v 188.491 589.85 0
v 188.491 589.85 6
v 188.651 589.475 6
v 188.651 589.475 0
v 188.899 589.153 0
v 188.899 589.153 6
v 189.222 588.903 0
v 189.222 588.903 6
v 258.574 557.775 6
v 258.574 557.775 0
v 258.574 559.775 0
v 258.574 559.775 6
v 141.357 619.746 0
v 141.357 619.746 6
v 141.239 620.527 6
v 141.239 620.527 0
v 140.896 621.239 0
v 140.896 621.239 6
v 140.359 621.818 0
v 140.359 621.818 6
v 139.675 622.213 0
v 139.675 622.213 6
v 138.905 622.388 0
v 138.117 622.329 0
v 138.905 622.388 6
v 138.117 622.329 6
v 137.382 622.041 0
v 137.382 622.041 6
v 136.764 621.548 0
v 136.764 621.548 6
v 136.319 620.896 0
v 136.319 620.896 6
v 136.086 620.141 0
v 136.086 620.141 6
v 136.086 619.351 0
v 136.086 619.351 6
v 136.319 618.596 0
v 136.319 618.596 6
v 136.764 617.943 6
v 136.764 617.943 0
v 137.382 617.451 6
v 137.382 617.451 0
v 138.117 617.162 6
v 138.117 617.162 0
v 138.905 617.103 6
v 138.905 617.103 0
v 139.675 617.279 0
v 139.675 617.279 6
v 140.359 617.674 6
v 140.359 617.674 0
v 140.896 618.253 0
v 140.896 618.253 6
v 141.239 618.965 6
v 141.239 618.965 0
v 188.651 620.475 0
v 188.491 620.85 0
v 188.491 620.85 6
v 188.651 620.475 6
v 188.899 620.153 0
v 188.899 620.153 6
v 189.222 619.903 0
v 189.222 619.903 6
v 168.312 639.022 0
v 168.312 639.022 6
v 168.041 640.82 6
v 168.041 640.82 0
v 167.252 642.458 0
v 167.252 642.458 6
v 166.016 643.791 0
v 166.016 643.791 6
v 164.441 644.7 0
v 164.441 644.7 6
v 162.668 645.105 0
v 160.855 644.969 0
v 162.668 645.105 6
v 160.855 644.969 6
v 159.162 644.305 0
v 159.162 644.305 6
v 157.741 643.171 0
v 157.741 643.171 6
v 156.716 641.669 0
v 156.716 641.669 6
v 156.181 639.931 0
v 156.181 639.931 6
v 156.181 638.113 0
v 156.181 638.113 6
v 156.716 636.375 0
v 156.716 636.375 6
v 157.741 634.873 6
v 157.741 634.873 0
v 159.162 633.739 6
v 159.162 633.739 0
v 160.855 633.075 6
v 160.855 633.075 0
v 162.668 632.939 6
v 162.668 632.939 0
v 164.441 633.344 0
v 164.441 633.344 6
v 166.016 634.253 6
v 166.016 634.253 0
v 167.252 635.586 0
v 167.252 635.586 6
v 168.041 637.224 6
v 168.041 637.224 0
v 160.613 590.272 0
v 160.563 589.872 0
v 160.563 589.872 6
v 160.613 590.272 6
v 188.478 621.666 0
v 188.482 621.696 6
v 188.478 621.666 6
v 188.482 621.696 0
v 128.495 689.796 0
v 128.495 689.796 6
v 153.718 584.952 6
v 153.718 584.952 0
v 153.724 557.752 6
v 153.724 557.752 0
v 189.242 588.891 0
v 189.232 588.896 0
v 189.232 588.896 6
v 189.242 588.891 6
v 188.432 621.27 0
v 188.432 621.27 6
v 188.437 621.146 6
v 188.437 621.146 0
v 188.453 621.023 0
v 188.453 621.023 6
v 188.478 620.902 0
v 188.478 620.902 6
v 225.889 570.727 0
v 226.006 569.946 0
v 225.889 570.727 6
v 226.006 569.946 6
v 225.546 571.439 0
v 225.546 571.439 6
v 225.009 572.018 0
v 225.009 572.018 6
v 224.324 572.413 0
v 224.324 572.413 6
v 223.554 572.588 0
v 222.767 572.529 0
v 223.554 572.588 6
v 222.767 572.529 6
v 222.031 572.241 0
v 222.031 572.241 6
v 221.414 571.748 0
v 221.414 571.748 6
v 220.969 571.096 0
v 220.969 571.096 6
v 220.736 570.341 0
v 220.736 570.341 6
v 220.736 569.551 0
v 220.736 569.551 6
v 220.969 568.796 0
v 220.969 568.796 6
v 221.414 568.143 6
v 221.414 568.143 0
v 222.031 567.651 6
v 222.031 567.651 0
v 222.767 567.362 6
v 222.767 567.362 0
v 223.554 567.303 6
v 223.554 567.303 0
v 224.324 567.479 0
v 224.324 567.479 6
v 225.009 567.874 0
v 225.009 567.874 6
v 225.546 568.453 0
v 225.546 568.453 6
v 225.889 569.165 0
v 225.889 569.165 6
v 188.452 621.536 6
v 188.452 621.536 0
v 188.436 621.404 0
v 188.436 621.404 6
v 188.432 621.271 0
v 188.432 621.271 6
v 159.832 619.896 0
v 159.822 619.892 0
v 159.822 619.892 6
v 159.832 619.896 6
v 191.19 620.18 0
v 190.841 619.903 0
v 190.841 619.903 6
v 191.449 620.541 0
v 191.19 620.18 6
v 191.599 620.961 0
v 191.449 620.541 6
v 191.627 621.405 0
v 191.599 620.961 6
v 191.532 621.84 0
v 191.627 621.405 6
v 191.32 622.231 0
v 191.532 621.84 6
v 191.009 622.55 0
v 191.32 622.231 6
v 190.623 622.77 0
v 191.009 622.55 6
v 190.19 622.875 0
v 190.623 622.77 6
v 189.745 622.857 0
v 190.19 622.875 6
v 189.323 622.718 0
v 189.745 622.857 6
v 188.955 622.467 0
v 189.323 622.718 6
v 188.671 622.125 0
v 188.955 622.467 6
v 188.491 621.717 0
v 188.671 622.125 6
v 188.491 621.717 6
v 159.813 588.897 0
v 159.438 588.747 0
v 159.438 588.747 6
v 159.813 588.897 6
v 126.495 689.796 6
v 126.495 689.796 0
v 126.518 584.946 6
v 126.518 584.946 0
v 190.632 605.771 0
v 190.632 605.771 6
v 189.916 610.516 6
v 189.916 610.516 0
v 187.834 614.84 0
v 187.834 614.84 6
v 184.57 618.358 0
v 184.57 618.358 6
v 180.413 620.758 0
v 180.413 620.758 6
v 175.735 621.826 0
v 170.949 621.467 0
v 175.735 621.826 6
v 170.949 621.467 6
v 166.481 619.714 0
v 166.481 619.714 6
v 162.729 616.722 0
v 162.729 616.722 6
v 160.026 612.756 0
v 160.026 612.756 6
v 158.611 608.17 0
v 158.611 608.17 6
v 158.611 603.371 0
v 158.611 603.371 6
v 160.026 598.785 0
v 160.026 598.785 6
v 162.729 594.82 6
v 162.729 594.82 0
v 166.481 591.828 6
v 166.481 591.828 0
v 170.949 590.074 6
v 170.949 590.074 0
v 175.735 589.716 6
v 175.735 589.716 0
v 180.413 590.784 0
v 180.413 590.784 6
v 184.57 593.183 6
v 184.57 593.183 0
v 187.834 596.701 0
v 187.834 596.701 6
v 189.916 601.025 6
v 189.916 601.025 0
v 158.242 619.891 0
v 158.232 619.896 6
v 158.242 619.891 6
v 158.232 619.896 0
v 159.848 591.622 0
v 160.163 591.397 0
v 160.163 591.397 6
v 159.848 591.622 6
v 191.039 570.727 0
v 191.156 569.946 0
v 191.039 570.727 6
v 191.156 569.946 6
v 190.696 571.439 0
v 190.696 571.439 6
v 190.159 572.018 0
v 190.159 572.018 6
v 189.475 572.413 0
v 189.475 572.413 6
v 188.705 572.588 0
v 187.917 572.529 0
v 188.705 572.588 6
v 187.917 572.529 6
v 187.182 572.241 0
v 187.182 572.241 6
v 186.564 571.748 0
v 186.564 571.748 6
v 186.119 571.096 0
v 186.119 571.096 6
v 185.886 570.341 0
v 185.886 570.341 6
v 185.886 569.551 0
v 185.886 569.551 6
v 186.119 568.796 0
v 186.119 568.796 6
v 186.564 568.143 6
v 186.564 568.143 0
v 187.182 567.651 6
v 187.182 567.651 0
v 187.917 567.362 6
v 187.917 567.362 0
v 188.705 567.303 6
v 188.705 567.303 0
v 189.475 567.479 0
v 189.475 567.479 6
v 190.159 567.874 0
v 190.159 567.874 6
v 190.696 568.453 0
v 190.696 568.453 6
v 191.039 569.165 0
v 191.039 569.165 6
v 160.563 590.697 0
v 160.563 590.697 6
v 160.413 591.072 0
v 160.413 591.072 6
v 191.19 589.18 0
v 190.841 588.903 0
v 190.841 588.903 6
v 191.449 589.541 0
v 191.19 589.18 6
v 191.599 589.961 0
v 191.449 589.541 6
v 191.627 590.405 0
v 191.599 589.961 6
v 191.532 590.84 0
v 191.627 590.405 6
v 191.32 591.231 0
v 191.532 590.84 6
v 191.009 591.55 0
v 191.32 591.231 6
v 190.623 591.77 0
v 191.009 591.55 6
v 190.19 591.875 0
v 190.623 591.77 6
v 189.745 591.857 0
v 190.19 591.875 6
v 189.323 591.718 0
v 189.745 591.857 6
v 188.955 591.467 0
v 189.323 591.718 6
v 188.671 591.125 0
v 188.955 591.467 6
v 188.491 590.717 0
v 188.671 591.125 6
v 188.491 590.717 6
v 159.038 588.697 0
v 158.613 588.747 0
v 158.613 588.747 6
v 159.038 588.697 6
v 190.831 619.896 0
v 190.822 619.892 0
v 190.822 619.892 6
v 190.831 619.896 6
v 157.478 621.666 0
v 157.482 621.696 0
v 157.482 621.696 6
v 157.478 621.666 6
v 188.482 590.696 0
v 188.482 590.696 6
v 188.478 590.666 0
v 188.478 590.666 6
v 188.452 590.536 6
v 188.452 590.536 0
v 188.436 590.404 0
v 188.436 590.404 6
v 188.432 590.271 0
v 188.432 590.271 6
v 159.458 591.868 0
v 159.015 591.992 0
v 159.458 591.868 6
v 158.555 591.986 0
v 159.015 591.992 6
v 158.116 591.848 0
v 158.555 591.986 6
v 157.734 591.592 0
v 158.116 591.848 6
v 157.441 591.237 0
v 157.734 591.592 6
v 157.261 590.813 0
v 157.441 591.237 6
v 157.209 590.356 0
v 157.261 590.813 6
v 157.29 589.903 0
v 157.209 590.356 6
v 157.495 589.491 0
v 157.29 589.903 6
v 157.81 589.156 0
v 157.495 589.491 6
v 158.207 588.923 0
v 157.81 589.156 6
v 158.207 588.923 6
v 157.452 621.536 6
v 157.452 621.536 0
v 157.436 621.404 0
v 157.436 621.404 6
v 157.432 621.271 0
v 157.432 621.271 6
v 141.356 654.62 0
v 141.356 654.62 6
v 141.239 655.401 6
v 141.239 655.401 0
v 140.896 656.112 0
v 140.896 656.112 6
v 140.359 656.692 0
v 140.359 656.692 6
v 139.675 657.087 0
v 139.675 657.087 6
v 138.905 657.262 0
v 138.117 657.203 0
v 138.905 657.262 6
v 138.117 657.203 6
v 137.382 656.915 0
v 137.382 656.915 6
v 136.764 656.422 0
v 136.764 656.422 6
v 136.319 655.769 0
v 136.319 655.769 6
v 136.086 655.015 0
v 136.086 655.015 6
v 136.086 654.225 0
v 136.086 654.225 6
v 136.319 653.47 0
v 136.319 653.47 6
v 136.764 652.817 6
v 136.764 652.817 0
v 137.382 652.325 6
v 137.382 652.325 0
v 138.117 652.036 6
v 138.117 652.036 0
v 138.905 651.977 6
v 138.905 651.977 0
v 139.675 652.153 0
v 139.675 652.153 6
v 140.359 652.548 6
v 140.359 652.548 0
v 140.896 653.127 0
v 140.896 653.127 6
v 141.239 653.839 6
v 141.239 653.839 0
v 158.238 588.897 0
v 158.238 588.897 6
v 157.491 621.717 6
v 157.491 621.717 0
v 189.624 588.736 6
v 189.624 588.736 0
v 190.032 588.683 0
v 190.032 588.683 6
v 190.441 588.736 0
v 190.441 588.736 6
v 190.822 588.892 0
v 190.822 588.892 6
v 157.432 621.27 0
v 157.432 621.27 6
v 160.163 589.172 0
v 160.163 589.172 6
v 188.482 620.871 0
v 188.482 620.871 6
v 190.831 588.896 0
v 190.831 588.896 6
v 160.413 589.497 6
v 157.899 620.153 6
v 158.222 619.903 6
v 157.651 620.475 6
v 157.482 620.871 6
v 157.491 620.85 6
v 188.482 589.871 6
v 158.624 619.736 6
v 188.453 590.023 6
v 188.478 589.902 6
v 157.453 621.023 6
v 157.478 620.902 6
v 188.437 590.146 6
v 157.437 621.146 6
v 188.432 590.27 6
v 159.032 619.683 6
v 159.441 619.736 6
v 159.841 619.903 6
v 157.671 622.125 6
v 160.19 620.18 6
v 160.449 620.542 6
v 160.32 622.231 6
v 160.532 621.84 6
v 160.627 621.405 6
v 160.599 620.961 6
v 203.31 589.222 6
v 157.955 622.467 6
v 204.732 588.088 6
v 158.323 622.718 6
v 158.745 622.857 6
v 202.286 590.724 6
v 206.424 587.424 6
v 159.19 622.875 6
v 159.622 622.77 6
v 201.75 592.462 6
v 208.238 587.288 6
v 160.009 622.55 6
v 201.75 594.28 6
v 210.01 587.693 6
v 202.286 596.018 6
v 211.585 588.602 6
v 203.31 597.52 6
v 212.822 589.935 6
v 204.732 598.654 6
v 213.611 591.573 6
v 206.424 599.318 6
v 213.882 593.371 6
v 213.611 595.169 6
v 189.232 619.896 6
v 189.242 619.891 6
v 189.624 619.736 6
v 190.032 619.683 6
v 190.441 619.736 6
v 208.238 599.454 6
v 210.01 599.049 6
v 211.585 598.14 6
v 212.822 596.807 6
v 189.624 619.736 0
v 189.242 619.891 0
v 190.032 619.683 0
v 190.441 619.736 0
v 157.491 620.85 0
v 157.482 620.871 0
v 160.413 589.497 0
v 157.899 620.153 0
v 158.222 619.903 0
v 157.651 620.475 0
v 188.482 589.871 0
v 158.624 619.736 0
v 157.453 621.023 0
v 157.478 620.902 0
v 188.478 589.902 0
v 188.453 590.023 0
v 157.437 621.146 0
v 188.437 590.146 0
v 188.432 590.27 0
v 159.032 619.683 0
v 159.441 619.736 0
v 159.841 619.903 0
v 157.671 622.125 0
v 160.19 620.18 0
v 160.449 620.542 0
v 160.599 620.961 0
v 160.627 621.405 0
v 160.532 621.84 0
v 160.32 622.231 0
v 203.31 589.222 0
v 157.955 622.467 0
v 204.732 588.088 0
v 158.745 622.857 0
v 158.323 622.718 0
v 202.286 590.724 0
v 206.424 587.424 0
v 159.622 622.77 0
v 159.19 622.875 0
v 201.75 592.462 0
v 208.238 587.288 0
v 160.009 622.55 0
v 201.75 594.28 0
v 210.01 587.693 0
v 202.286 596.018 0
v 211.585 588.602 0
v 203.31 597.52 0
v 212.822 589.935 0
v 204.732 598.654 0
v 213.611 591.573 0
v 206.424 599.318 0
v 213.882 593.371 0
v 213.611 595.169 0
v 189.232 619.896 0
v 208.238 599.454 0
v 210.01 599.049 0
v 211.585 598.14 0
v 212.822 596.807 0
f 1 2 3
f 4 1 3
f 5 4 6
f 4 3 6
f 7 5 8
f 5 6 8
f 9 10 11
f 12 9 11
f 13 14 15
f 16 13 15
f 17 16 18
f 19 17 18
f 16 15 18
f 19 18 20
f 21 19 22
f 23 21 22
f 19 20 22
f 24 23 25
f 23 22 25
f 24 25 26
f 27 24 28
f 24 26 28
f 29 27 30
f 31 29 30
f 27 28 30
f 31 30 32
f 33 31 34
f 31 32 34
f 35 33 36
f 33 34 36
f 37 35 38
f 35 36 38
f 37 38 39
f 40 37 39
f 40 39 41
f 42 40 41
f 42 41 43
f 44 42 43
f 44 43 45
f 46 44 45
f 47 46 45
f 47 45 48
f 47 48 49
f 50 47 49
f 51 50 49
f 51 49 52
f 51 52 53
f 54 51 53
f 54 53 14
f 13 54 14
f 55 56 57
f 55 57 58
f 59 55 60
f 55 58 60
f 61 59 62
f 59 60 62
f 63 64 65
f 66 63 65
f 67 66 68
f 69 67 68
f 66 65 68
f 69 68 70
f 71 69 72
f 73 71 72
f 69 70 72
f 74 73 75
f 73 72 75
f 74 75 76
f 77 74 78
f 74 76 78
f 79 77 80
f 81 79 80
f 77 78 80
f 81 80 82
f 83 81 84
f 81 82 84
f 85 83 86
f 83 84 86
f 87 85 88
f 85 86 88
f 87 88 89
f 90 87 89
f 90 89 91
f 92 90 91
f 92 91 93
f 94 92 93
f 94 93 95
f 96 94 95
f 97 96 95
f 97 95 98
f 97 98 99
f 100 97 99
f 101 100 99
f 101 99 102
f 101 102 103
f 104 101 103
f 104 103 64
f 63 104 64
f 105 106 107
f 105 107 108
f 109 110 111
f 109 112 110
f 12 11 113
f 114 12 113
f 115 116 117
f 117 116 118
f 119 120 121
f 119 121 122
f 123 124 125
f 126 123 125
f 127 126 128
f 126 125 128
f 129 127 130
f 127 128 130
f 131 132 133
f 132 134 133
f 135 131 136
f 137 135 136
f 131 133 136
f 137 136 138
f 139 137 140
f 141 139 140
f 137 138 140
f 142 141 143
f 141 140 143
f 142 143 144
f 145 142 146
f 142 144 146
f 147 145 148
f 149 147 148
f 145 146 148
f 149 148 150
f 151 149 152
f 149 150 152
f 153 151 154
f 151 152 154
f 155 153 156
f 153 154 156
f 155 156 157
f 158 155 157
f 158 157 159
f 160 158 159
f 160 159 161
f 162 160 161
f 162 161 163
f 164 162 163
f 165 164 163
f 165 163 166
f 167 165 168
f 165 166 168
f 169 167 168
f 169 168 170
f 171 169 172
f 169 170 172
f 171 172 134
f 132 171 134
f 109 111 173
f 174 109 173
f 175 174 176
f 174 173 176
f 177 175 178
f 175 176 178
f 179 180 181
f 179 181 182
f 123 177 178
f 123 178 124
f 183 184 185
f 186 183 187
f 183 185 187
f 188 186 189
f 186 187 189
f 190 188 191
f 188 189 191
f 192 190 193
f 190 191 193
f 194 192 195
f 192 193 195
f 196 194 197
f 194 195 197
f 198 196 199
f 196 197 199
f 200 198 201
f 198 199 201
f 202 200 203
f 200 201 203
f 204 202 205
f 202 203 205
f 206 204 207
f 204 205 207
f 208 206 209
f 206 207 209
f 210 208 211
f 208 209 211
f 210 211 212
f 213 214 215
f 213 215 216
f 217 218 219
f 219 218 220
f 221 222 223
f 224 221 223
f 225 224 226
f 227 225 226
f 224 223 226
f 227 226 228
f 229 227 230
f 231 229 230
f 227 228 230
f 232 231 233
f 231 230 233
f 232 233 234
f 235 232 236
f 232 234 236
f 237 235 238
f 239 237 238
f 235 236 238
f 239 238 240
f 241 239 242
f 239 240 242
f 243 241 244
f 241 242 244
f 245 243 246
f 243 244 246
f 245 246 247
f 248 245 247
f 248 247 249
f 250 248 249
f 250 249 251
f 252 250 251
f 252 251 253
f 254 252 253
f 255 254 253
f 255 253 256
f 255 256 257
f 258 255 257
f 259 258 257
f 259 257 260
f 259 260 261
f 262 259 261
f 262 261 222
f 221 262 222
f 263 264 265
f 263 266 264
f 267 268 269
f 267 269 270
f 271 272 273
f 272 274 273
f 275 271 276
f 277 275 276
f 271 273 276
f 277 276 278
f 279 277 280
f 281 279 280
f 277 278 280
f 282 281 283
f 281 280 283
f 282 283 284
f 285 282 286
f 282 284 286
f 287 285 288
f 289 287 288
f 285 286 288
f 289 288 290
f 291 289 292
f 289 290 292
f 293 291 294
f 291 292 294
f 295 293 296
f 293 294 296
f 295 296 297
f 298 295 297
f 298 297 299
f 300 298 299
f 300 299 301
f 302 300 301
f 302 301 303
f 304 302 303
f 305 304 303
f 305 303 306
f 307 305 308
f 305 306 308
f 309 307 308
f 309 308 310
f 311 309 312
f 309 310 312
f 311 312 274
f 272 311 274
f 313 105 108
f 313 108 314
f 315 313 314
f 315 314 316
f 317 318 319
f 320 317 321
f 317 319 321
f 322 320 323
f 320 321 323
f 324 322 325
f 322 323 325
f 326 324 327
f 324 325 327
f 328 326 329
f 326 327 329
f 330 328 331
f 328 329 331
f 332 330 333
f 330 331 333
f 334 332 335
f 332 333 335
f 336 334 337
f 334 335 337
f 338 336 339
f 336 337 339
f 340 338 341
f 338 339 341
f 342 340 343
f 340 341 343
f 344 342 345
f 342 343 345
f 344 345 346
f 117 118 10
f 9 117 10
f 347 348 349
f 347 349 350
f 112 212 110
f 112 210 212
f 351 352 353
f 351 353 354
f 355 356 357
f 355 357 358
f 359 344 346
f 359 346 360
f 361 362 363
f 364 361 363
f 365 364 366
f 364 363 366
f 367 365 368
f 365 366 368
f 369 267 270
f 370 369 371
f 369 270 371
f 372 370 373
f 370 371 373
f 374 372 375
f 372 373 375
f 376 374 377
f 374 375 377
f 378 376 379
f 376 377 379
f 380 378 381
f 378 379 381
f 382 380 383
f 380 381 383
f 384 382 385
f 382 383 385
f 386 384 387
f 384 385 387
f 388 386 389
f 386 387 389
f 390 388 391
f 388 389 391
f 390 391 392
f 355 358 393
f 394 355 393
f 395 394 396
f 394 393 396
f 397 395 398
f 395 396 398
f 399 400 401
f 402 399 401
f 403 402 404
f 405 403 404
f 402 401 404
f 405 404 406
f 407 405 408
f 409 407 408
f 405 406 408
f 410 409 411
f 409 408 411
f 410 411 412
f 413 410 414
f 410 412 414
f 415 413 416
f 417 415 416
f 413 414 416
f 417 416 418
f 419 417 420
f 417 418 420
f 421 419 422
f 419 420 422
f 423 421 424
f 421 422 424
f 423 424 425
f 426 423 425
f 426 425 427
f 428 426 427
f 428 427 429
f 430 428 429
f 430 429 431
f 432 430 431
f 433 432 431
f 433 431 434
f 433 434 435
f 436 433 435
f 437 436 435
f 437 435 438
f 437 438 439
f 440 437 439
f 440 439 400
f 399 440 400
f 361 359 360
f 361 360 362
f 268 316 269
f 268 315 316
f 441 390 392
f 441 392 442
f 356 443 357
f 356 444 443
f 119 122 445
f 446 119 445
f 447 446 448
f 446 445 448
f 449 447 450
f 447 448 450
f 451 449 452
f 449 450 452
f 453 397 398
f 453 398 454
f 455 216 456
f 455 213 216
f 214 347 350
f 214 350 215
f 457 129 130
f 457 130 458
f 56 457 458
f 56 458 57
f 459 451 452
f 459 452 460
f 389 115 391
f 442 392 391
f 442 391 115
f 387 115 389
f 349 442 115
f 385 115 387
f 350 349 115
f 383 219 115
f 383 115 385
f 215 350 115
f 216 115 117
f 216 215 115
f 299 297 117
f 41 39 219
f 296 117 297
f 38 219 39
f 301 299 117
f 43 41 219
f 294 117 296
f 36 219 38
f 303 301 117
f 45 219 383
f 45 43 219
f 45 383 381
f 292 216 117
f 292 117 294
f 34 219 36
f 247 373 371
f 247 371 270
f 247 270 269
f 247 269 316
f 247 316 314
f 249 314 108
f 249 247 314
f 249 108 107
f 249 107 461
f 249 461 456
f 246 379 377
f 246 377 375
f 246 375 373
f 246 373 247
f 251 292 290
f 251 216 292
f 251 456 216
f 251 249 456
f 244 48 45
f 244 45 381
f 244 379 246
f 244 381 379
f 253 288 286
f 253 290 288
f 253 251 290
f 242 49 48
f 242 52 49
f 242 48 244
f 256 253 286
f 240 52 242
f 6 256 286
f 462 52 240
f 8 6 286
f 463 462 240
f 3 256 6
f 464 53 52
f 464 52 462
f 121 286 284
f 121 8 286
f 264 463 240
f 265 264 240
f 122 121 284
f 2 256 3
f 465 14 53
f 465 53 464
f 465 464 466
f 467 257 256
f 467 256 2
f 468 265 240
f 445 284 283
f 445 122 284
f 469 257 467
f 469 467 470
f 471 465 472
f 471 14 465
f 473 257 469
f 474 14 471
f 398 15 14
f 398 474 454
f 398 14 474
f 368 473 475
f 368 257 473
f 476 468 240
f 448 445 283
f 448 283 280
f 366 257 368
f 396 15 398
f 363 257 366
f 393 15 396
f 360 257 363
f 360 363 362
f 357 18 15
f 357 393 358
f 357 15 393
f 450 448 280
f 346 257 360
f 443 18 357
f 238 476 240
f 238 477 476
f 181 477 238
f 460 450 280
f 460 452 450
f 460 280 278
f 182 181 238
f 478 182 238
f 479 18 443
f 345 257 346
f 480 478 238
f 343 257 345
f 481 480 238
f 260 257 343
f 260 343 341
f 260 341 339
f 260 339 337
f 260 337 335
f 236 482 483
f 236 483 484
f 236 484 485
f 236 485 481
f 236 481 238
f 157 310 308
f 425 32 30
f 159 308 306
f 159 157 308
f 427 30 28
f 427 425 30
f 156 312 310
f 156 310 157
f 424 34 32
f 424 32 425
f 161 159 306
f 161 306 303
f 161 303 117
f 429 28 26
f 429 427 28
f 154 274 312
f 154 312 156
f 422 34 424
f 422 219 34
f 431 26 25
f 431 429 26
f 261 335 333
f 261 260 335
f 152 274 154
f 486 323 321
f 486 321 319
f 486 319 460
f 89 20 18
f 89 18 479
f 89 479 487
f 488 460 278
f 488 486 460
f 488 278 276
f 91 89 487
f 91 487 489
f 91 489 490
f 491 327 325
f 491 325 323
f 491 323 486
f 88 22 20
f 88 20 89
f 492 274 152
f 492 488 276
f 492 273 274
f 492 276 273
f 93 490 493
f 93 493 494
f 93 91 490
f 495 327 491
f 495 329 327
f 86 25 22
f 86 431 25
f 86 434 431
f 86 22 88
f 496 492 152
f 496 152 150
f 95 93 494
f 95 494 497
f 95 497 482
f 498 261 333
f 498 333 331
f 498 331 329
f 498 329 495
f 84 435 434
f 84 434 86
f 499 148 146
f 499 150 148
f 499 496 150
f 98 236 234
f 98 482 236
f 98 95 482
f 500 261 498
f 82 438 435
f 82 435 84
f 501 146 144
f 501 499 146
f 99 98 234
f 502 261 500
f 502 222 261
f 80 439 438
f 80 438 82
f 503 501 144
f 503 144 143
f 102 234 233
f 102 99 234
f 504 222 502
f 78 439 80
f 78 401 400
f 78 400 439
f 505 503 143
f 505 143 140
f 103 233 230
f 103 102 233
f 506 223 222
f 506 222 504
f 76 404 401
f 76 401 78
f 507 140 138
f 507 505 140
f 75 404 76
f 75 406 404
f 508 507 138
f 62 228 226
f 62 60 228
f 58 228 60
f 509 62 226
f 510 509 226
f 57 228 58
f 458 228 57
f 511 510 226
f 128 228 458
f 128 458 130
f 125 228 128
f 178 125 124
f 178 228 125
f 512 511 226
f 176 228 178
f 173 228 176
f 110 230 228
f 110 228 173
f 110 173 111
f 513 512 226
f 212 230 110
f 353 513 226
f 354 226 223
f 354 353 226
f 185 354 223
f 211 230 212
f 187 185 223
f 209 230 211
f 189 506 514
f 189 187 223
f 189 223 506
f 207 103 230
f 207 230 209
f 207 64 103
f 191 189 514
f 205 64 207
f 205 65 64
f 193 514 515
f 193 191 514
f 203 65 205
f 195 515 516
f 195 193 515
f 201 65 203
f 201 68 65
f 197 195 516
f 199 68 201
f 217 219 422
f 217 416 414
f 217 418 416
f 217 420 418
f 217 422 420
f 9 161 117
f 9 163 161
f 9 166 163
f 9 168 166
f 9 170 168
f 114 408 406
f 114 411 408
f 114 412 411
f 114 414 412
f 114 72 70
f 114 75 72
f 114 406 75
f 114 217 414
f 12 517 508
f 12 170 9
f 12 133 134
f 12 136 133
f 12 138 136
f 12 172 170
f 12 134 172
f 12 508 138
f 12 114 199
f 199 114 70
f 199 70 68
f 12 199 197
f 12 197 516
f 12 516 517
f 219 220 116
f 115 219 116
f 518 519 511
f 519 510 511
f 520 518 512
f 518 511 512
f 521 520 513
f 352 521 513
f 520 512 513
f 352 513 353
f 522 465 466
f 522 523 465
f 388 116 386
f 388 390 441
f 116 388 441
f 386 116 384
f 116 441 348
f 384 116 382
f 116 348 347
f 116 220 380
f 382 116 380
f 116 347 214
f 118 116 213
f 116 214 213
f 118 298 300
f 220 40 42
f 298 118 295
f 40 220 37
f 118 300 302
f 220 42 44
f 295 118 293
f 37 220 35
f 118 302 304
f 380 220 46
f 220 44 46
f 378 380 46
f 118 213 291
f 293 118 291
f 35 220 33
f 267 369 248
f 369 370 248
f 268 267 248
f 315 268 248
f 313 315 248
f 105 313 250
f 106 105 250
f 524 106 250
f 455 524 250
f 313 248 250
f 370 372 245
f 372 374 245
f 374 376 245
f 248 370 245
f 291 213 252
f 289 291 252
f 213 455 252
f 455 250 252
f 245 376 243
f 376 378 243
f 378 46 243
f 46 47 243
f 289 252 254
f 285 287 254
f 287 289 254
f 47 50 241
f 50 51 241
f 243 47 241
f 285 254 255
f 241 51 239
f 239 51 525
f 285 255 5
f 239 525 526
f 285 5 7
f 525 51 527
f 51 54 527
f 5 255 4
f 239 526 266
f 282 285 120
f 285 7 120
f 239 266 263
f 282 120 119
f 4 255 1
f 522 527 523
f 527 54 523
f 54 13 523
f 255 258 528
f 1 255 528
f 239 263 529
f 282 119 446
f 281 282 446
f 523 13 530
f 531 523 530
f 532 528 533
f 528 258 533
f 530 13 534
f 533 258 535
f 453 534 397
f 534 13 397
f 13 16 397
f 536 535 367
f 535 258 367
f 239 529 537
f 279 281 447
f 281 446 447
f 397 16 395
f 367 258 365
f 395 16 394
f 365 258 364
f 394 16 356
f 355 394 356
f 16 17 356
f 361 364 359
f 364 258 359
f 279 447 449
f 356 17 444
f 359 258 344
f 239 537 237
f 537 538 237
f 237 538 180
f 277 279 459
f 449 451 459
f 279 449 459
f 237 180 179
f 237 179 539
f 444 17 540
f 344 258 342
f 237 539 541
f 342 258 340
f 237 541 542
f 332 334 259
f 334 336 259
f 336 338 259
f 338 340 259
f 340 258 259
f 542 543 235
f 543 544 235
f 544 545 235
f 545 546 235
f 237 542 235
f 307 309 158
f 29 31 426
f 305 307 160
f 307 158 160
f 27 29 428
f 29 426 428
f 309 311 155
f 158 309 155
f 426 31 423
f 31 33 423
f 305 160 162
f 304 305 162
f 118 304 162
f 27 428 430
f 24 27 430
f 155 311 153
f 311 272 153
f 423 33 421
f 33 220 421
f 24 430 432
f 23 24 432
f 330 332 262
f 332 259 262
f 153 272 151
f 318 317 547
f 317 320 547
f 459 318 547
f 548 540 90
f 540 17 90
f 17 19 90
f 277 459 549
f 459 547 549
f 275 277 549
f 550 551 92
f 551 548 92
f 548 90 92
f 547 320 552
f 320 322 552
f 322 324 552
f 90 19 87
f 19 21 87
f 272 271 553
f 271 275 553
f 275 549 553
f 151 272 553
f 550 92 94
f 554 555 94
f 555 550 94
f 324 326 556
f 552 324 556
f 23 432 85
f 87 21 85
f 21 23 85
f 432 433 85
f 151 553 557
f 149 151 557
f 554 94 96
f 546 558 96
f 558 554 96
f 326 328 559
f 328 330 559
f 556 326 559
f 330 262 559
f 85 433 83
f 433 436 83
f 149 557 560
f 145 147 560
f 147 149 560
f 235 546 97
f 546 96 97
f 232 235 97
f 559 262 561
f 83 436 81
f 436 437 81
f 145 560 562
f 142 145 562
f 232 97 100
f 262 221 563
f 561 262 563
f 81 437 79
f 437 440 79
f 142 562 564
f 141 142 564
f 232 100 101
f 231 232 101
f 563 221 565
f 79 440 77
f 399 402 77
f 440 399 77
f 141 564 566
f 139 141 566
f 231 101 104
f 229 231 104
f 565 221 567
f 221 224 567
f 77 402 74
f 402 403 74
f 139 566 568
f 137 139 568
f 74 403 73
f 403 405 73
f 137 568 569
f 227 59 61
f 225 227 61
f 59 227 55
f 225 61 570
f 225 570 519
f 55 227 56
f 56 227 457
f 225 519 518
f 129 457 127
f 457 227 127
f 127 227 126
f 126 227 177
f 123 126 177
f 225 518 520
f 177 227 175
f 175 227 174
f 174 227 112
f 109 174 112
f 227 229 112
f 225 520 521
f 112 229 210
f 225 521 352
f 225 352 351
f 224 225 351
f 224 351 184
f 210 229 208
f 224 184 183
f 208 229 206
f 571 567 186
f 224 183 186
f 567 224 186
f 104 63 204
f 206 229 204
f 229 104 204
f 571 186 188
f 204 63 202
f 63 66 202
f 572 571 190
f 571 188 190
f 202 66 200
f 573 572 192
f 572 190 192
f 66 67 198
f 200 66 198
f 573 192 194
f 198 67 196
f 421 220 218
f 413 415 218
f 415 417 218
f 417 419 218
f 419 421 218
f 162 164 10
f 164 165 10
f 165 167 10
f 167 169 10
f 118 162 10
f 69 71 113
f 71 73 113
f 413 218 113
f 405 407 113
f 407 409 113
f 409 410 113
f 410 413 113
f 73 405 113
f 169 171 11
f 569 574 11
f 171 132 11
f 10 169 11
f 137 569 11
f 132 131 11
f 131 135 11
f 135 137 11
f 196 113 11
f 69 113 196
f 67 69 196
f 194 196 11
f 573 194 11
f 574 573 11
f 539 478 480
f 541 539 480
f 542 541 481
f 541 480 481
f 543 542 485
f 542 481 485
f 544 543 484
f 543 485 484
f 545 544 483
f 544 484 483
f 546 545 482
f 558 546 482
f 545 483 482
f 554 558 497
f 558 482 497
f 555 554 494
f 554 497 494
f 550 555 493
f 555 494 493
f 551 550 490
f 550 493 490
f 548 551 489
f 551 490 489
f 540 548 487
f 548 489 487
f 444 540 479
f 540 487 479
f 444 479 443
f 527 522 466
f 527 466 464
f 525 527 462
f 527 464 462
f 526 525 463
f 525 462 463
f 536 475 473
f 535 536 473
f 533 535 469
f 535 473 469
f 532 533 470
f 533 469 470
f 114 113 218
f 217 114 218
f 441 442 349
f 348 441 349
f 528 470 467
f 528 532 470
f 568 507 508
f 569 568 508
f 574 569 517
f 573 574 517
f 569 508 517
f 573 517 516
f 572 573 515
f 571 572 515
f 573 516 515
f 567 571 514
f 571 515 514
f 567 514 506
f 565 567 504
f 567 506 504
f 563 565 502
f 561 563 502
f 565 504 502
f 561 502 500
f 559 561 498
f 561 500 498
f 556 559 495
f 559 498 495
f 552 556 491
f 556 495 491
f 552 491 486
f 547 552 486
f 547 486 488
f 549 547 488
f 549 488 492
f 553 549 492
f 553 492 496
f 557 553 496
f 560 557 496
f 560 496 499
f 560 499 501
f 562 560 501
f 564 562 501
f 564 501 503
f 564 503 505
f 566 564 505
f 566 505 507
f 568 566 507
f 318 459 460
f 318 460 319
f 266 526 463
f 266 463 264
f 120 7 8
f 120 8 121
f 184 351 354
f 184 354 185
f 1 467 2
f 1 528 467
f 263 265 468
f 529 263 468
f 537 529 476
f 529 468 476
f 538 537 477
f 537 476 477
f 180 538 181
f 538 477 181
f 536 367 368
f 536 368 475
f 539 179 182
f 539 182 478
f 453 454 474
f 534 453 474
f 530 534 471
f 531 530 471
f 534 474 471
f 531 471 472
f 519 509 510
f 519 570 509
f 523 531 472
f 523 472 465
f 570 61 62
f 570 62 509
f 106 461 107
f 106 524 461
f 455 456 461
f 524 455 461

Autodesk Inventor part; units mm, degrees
ref_plane "YZ Plane" through (0, 0, 0) normal (1, 0, 0) x (0, 1, 0)
ref_plane "XZ Plane" through (0, 0, 0) normal (0, 1, 0) x (-1, 0, 0)
ref_plane "XY Plane" through (0, 0, 0) normal (0, 0, 1) x (1, 0, 0)
sketch "Sketch1" plane through (0, 0, 0) normal (0, 0, 1) x (1, 0, 0)
  line L0 (141.1314, 655.2458) -> (140.8814, 655.8708)
  line L1 (140.8814, 655.8708) -> (140.4815, 656.3958)
  line L2 (140.4815, 656.3958) -> (139.9565, 656.7958)
  line L3 (139.9565, 656.7958) -> (139.3565, 657.0458)
  line L4 (139.3565, 657.0458) -> (138.7065, 657.1208)
  line L5 (138.7065, 657.1208) -> (138.0565, 657.0457)
  line L6 (138.0565, 657.0457) -> (137.4315, 656.7958)
  line L7 (137.4315, 656.7958) -> (136.9065, 656.3958)
  line L8 (136.9065, 656.3958) -> (136.5065, 655.8708)
  line L9 (136.5065, 655.8708) -> (136.2565, 655.2458)
  line L10 (136.2565, 655.2458) -> (136.1815, 654.5958)
  line L11 (136.1815, 654.5958) -> (136.2565, 653.9458)
  line L12 (136.2565, 653.9458) -> (136.5066, 653.3458)
  line L13 (136.5066, 653.3458) -> (136.9065, 652.8208)
  line L14 (136.9065, 652.8208) -> (137.4315, 652.4208)
  line L15 (137.4315, 652.4208) -> (138.0566, 652.1708)
  line L16 (138.0566, 652.1708) -> (138.7065, 652.0958)
  line L17 (138.7065, 652.0958) -> (139.3565, 652.1708)
  line L18 (139.3565, 652.1708) -> (139.9565, 652.4209)
  line L19 (139.9565, 652.4209) -> (140.4815, 652.8208)
  line L20 (140.4815, 652.8208) -> (140.8815, 653.3458)
  line L21 (140.8815, 653.3458) -> (141.1316, 653.9458)
  line L22 (141.1316, 653.9458) -> (141.2315, 654.5952)
  line L23 (141.2315, 654.5952) -> (141.1314, 655.2458)
  line L24 (141.1315, 620.3958) -> (140.8816, 621.0208)
  line L25 (140.8816, 621.0208) -> (140.4817, 621.5458)
  line L26 (140.4817, 621.5458) -> (139.9567, 621.9458)
  line L27 (139.9567, 621.9458) -> (139.3567, 622.1958)
  line L28 (139.3567, 622.1958) -> (138.7067, 622.2708)
  line L29 (138.7067, 622.2708) -> (138.0565, 622.1957)
  line L30 (138.0565, 622.1957) -> (137.4315, 621.9458)
  line L31 (137.4315, 621.9458) -> (136.9065, 621.5458)
  line L32 (136.9065, 621.5458) -> (136.5065, 621.0208)
  line L33 (136.5065, 621.0208) -> (136.2565, 620.3958)
  line L34 (136.2565, 620.3958) -> (136.1815, 619.7458)
  line L35 (136.1815, 619.7458) -> (136.2565, 619.0958)
  line L36 (136.2565, 619.0958) -> (136.5066, 618.4958)
  line L37 (136.5066, 618.4958) -> (136.9065, 617.9708)
  line L38 (136.9065, 617.9708) -> (137.4315, 617.5708)
  line L39 (137.4315, 617.5708) -> (138.0566, 617.3208)
  line L40 (138.0566, 617.3208) -> (138.7065, 617.2208)
  line L41 (138.7065, 617.2208) -> (139.3565, 617.3208)
  line L42 (139.3565, 617.3208) -> (139.9565, 617.5708)
  line L43 (139.9565, 617.5708) -> (140.4815, 617.9708)
  line L44 (140.4815, 617.9708) -> (140.8815, 618.4957)
  line L45 (140.8815, 618.4957) -> (141.1315, 619.0958)
  line L46 (141.1315, 619.0958) -> (141.2316, 619.7458)
  line L47 (141.2316, 619.7458) -> (141.1315, 620.3958)
  line L48 (160.5564, 621.6955) -> (160.4065, 622.0705)
  line L49 (160.4065, 622.0705) -> (160.1565, 622.3956)
  line L50 (160.1565, 622.3956) -> (159.8315, 622.6456)
  line L51 (159.8315, 622.6456) -> (159.4315, 622.8206)
  line L52 (159.4315, 622.8206) -> (159.0316, 622.8707)
  line L53 (159.0316, 622.8707) -> (158.6065, 622.8207)
  line L54 (158.6065, 622.8207) -> (158.2315, 622.6458)
  line L55 (158.2315, 622.6458) -> (157.9065, 622.3958)
  line L56 (157.9065, 622.3958) -> (157.6565, 622.0708)
  line L57 (157.6565, 622.0708) -> (157.4815, 621.6958)
  line L58 (157.4815, 621.6958) -> (157.4315, 621.2708)
  line L59 (157.4315, 621.2708) -> (157.4815, 620.8708)
  line L60 (157.4815, 620.8708) -> (157.6565, 620.4958)
  line L61 (157.6565, 620.4958) -> (157.9065, 620.1458)
  line L62 (157.9065, 620.1458) -> (158.2315, 619.8957)
  line L63 (158.2315, 619.8957) -> (158.6065, 619.7457)
  line L64 (158.6065, 619.7457) -> (159.0315, 619.6957)
  line L65 (159.0315, 619.6957) -> (159.4314, 619.7457)
  line L66 (159.4314, 619.7457) -> (159.8315, 619.8957)
  line L67 (159.8315, 619.8957) -> (160.1565, 620.1457)
  line L68 (160.1565, 620.1457) -> (160.4063, 620.4956)
  line L69 (160.4063, 620.4956) -> (160.5563, 620.8706)
  line L70 (160.5563, 620.8706) -> (160.6063, 621.2705)
  line L71 (160.6063, 621.2705) -> (160.5564, 621.6955)
  line L72 (189.9814, 609.9208) -> (188.3815, 613.7708)
  line L73 (188.3815, 613.7708) -> (185.8314, 617.0958)
  line L74 (185.8314, 617.0958) -> (182.5315, 619.6458)
  line L75 (182.5315, 619.6458) -> (178.6565, 621.2458)
  line L76 (178.6565, 621.2458) -> (174.5315, 621.7708)
  line L77 (174.5315, 621.7708) -> (170.3815, 621.2458)
  line L78 (170.3815, 621.2458) -> (166.5315, 619.6458)
  line L79 (166.5315, 619.6458) -> (163.2065, 617.0958)
  line L80 (163.2065, 617.0958) -> (160.6815, 613.7708)
  line L81 (160.6815, 613.7708) -> (159.0815, 609.9208)
  line L82 (159.0815, 609.9208) -> (158.5315, 605.7708)
  line L83 (158.5315, 605.7708) -> (159.0815, 601.6458)
  line L84 (159.0815, 601.6458) -> (160.6815, 597.7708)
  line L85 (160.6815, 597.7708) -> (163.2065, 594.4708)
  line L86 (163.2065, 594.4708) -> (166.5315, 591.9208)
  line L87 (166.5315, 591.9208) -> (170.3815, 590.3207)
  line L88 (170.3815, 590.3207) -> (174.5315, 589.7708)
  line L89 (174.5315, 589.7708) -> (178.6565, 590.3207)
  line L90 (178.6565, 590.3207) -> (182.5314, 591.9208)
  line L91 (182.5314, 591.9208) -> (185.8314, 594.4708)
  line L92 (185.8314, 594.4708) -> (188.3814, 597.7708)
  line L93 (188.3814, 597.7708) -> (189.9815, 601.6458)
  line L94 (189.9815, 601.6458) -> (190.5315, 605.7706)
  line L95 (190.5315, 605.7706) -> (189.9814, 609.9208)
  line L96 (191.5564, 621.6955) -> (191.4065, 622.0705)
  line L97 (191.4065, 622.0705) -> (191.1565, 622.3955)
  line L98 (191.1565, 622.3955) -> (190.8315, 622.6456)
  line L99 (190.8315, 622.6456) -> (190.4315, 622.8206)
  line L100 (190.4315, 622.8206) -> (190.0316, 622.8706)
  line L101 (190.0316, 622.8706) -> (189.6064, 622.8207)
  line L102 (189.6064, 622.8207) -> (189.2315, 622.6458)
  line L103 (189.2315, 622.6458) -> (188.9065, 622.3958)
  line L104 (188.9065, 622.3958) -> (188.6565, 622.0708)
  line L105 (188.6565, 622.0708) -> (188.4815, 621.6958)
  line L106 (188.4815, 621.6958) -> (188.4315, 621.2708)
  line L107 (188.4315, 621.2708) -> (188.4815, 620.8708)
  line L108 (188.4815, 620.8708) -> (188.6565, 620.4958)
  line L109 (188.6565, 620.4958) -> (188.9065, 620.1458)
  line L110 (188.9065, 620.1458) -> (189.2315, 619.8957)
  line L111 (189.2315, 619.8957) -> (189.6064, 619.7457)
  line L112 (189.6064, 619.7457) -> (190.0315, 619.6957)
  line L113 (190.0315, 619.6957) -> (190.4314, 619.7457)
  line L114 (190.4314, 619.7457) -> (190.8314, 619.8957)
  line L115 (190.8314, 619.8957) -> (191.1565, 620.1457)
  line L116 (191.1565, 620.1457) -> (191.4063, 620.4956)
  line L117 (191.4063, 620.4956) -> (191.5563, 620.8706)
  line L118 (191.5563, 620.8706) -> (191.6063, 621.2707)
  line L119 (191.6063, 621.2707) -> (191.5564, 621.6955)
  line L120 (213.5818, 594.921) -> (212.9818, 596.371)
  line L121 (212.9818, 596.371) -> (212.0318, 597.596)
  line L122 (212.0318, 597.596) -> (210.7817, 598.5708)
  line L123 (210.7817, 598.5708) -> (209.3317, 599.1709)
  line L124 (209.3317, 599.1709) -> (207.7817, 599.3708)
  line L125 (207.7817, 599.3708) -> (206.2317, 599.1709)
  line L126 (206.2317, 599.1709) -> (204.7817, 598.5708)
  line L127 (204.7817, 598.5708) -> (203.5317, 597.5958)
  line L128 (203.5317, 597.5958) -> (202.5817, 596.3708)
  line L129 (202.5817, 596.3708) -> (201.9817, 594.9208)
  line L130 (201.9817, 594.9208) -> (201.7817, 593.3708)
  line L131 (201.7817, 593.3708) -> (201.9817, 591.8208)
  line L132 (201.9817, 591.8208) -> (202.5818, 590.3708)
  line L133 (202.5818, 590.3708) -> (203.5318, 589.1209)
  line L134 (203.5318, 589.1209) -> (204.7819, 588.1709)
  line L135 (204.7819, 588.1709) -> (206.2319, 587.5709)
  line L136 (206.2319, 587.5709) -> (207.7819, 587.3709)
  line L137 (207.7819, 587.3709) -> (209.3319, 587.5709)
  line L138 (209.3319, 587.5709) -> (210.7819, 588.171)
  line L139 (210.7819, 588.171) -> (212.0317, 589.121)
  line L140 (212.0317, 589.121) -> (212.9818, 590.3712)
  line L141 (212.9818, 590.3712) -> (213.5818, 591.8212)
  line L142 (213.5818, 591.8212) -> (213.7818, 593.3712)
  line L143 (213.7818, 593.3712) -> (213.5818, 594.921)
  line L144 (191.5564, 590.6955) -> (191.4065, 591.0705)
  line L145 (191.4065, 591.0705) -> (191.1565, 591.3955)
  line L146 (191.1565, 591.3955) -> (190.8315, 591.6456)
  line L147 (190.8315, 591.6456) -> (190.4315, 591.8206)
  line L148 (190.4315, 591.8206) -> (190.0316, 591.8706)
  line L149 (190.0316, 591.8706) -> (189.6065, 591.8207)
  line L150 (189.6065, 591.8207) -> (189.2315, 591.6458)
  line L151 (189.2315, 591.6458) -> (188.9065, 591.3958)
  line L152 (188.9065, 591.3958) -> (188.6565, 591.0708)
  line L153 (188.6565, 591.0708) -> (188.4815, 590.6958)
  line L154 (188.4815, 590.6958) -> (188.4315, 590.2708)
  line L155 (188.4315, 590.2708) -> (188.4815, 589.8708)
  line L156 (188.4815, 589.8708) -> (188.6565, 589.4958)
  line L157 (188.6565, 589.4958) -> (188.9065, 589.1458)
  line L158 (188.9065, 589.1458) -> (189.2315, 588.8957)
  line L159 (189.2315, 588.8957) -> (189.6064, 588.7457)
  line L160 (189.6064, 588.7457) -> (190.0315, 588.6957)
  line L161 (190.0315, 588.6957) -> (190.4314, 588.7457)
  line L162 (190.4314, 588.7457) -> (190.8314, 588.8957)
  line L163 (190.8314, 588.8957) -> (191.1564, 589.1457)
  line L164 (191.1564, 589.1457) -> (191.4063, 589.4956)
  line L165 (191.4063, 589.4956) -> (191.5563, 589.8706)
  line L166 (191.5563, 589.8706) -> (191.6063, 590.2706)
  line L167 (191.6063, 590.2706) -> (191.5564, 590.6955)
  line L168 (190.9314, 570.5957) -> (190.6815, 571.2208)
  line L169 (190.6815, 571.2208) -> (190.2815, 571.7458)
  line L170 (190.2815, 571.7458) -> (189.7565, 572.1457)
  line L171 (189.7565, 572.1457) -> (189.1566, 572.3958)
  line L172 (189.1566, 572.3958) -> (188.5065, 572.4708)
  line L173 (188.5065, 572.4708) -> (187.8565, 572.3957)
  line L174 (187.8565, 572.3957) -> (187.2315, 572.1458)
  line L175 (187.2315, 572.1458) -> (186.7065, 571.7458)
  line L176 (186.7065, 571.7458) -> (186.3065, 571.2208)
  line L177 (186.3065, 571.2208) -> (186.0565, 570.5958)
  line L178 (186.0565, 570.5958) -> (185.9815, 569.9458)
  line L179 (185.9815, 569.9458) -> (186.0566, 569.2958)
  line L180 (186.0566, 569.2958) -> (186.3066, 568.6958)
  line L181 (186.3066, 568.6958) -> (186.7066, 568.1708)
  line L182 (186.7066, 568.1708) -> (187.2316, 567.7708)
  line L183 (187.2316, 567.7708) -> (187.8566, 567.5208)
  line L184 (187.8566, 567.5208) -> (188.5065, 567.4208)
  line L185 (188.5065, 567.4208) -> (189.1566, 567.5208)
  line L186 (189.1566, 567.5208) -> (189.7565, 567.7708)
  line L187 (189.7565, 567.7708) -> (190.2816, 568.1708)
  line L188 (190.2816, 568.1708) -> (190.6816, 568.6958)
  line L189 (190.6816, 568.6958) -> (190.9316, 569.2958)
  line L190 (190.9316, 569.2958) -> (191.0315, 569.9452)
  line L191 (191.0315, 569.9452) -> (190.9314, 570.5957)
  line L192 (225.7813, 570.5958) -> (225.5313, 571.2209)
  line L193 (225.5313, 571.2209) -> (225.1314, 571.7459)
  line L194 (225.1314, 571.7459) -> (224.6064, 572.1458)
  line L195 (224.6064, 572.1458) -> (224.0064, 572.3958)
  line L196 (224.0064, 572.3958) -> (223.3564, 572.4709)
  line L197 (223.3564, 572.4709) -> (222.7064, 572.3958)
  line L198 (222.7064, 572.3958) -> (222.0814, 572.1458)
  line L199 (222.0814, 572.1458) -> (221.5814, 571.7458)
  line L200 (221.5814, 571.7458) -> (221.1814, 571.2208)
  line L201 (221.1814, 571.2208) -> (220.9064, 570.5958)
  line L202 (220.9064, 570.5958) -> (220.8314, 569.9458)
  line L203 (220.8314, 569.9458) -> (220.9064, 569.2963)
  line L204 (220.9064, 569.2963) -> (221.1814, 568.696)
  line L205 (221.1814, 568.696) -> (221.5813, 568.171)
  line L206 (221.5813, 568.171) -> (222.0814, 567.771)
  line L207 (222.0814, 567.771) -> (222.7063, 567.521)
  line L208 (222.7063, 567.521) -> (223.3563, 567.421)
  line L209 (223.3563, 567.421) -> (224.0063, 567.521)
  line L210 (224.0063, 567.521) -> (224.6063, 567.771)
  line L211 (224.6063, 567.771) -> (225.1313, 568.171)
  line L212 (225.1313, 568.171) -> (225.5313, 568.696)
  line L213 (225.5313, 568.696) -> (225.7813, 569.296)
  line L214 (225.7813, 569.296) -> (225.8813, 569.9456)
  line L215 (225.8813, 569.9456) -> (225.7813, 570.5958)
  line L216 (160.5634, 590.697) -> (160.4134, 591.072)
  line L217 (160.4134, 591.072) -> (160.1634, 591.397)
  line L218 (160.1634, 591.397) -> (159.8134, 591.6469)
  line L219 (159.8134, 591.6469) -> (159.4383, 591.8219)
  line L220 (159.4383, 591.8219) -> (159.0384, 591.8719)
  line L221 (159.0384, 591.8719) -> (158.6133, 591.822)
  line L222 (158.6133, 591.822) -> (158.2383, 591.647)
  line L223 (158.2383, 591.647) -> (157.9133, 591.397)
  line L224 (157.9133, 591.397) -> (157.6633, 591.0721)
  line L225 (157.6633, 591.0721) -> (157.5133, 590.6971)
  line L226 (157.5133, 590.6971) -> (157.4383, 590.2721)
  line L227 (157.4383, 590.2721) -> (157.5133, 589.8721)
  line L228 (157.5133, 589.8721) -> (157.6632, 589.4971)
  line L229 (157.6632, 589.4971) -> (157.9132, 589.1721)
  line L230 (157.9132, 589.1721) -> (158.2381, 588.897)
  line L231 (158.2381, 588.897) -> (158.6131, 588.747)
  line L232 (158.6131, 588.747) -> (159.0381, 588.6969)
  line L233 (159.0381, 588.6969) -> (159.4381, 588.747)
  line L234 (159.4381, 588.747) -> (159.8131, 588.8969)
  line L235 (159.8131, 588.8969) -> (160.1631, 589.172)
  line L236 (160.1631, 589.172) -> (160.4132, 589.4969)
  line L237 (160.4132, 589.4969) -> (160.5632, 589.8719)
  line L238 (160.5632, 589.8719) -> (160.6132, 590.2722)
  line L239 (160.6132, 590.2722) -> (160.5634, 590.697)
  line L240 (128.495, 689.7962) -> (126.495, 689.7958)
  line L241 (126.495, 689.7958) -> (126.518, 584.9458)
  line L242 (126.518, 584.9458) -> (153.718, 584.9517)
  line L243 (153.718, 584.9517) -> (153.7239, 557.7518)
  line L244 (153.7239, 557.7518) -> (258.5739, 557.7747)
  line L245 (258.5739, 557.7747) -> (258.5735, 559.7747)
  line L246 (258.5735, 559.7747) -> (128.495, 689.7962)
  line L247 (168.0123, 640.5721) -> (167.4122, 642.0222)
  line L248 (167.4122, 642.0222) -> (166.4372, 643.2721)
  line L249 (166.4372, 643.2721) -> (165.2123, 644.2221)
  line L250 (165.2123, 644.2221) -> (163.7623, 644.8221)
  line L251 (163.7623, 644.8221) -> (162.2123, 645.0221)
  line L252 (162.2123, 645.0221) -> (160.6623, 644.8221)
  line L253 (160.6623, 644.8221) -> (159.2123, 644.2221)
  line L254 (159.2123, 644.2221) -> (157.9623, 643.272)
  line L255 (157.9623, 643.272) -> (157.0124, 642.022)
  line L256 (157.0124, 642.022) -> (156.4124, 640.572)
  line L257 (156.4124, 640.572) -> (156.2124, 639.022)
  line L258 (156.2124, 639.022) -> (156.4124, 637.472)
  line L259 (156.4124, 637.472) -> (157.0124, 636.022)
  line L260 (157.0124, 636.022) -> (157.9625, 634.7721)
  line L261 (157.9625, 634.7721) -> (159.2125, 633.8221)
  line L262 (159.2125, 633.8221) -> (160.6626, 633.2221)
  line L263 (160.6626, 633.2221) -> (162.2125, 633.0221)
  line L264 (162.2125, 633.0221) -> (163.7626, 633.2221)
  line L265 (163.7626, 633.2221) -> (165.2125, 633.8221)
  line L266 (165.2125, 633.8221) -> (166.4375, 634.7721)
  line L267 (166.4375, 634.7721) -> (167.4122, 636.022)
  line L268 (167.4122, 636.022) -> (168.0123, 637.4721)
  line L269 (168.0123, 637.4721) -> (168.2123, 639.0222)
  line L270 (168.2123, 639.0222) -> (168.0123, 640.5721)
  line L271 (258.4596, 560.9292) -> (260.4596, 560.9297)
  point P0 (0, 0)
extrude "Extrusion1" add sketch "Sketch1" along normal blind 6
sketch "Sketch2" plane through (0, 0, 6) normal (0, 0, 1) x (1, 0, 0)
  line L0 (138.7065, 652.0958) -> (138.0566, 652.1708) projected
  line L1 (138.7065, 657.1436) -> (138.7065, 652.0958)
  line L2 (163.7623, 644.8221) -> (162.2123, 645.0221) projected
  line L3 (162.2125, 633.0221) -> (163.7626, 633.2221) projected
  line L4 (162.2123, 645.0221) -> (162.2125, 633.0221)
  line L5 (189.6064, 622.8207) -> (190.0316, 622.8706) projected
  line L6 (190.4314, 619.7457) -> (190.0315, 619.6957) projected
  line L7 (190.0316, 622.8706) -> (190.0315, 619.6957)
  line L8 (206.2317, 599.1709) -> (207.7817, 599.3708) projected
  line L9 (209.3319, 587.5709) -> (207.7819, 587.3709) projected
  line L10 (207.7817, 599.3708) -> (207.7819, 587.3709)
  line L11 (223.3564, 572.4709) -> (224.0064, 572.3958) projected
  line L12 (224.0063, 567.521) -> (223.3563, 567.421) projected
  line L13 (223.3564, 572.4709) -> (223.3563, 567.421)
  line L14 (188.5065, 572.4708) -> (188.5065, 567.4208)
  line L15 (190.0316, 591.8706) -> (189.6065, 591.8207) projected
  line L16 (189.6064, 588.7457) -> (190.0315, 588.6957) projected
  line L17 (190.0316, 591.8706) -> (190.0315, 588.6957)
  line L18 (158.6133, 591.822) -> (159.0384, 591.8719) projected
  line L19 (159.0381, 588.6969) -> (158.6131, 588.747) projected
  line L20 (159.0384, 591.8719) -> (159.0381, 588.6969)
  line L21 (138.7067, 622.2708) -> (139.3567, 622.1958) projected
  line L22 (139.3565, 617.3208) -> (138.7065, 617.2208) projected
  line L23 (138.7067, 622.2708) -> (138.7065, 617.2208)
  line L24 (159.0316, 622.8707) -> (158.6065, 622.8207) projected
  line L25 (158.6065, 619.7457) -> (159.0315, 619.6957) projected
  line L26 (159.0316, 622.8707) -> (159.0315, 619.6957)
  line L27 (174.5315, 621.7708) -> (178.6565, 621.2458) projected
  line L28 (170.3815, 590.3207) -> (174.5315, 589.7708) projected
  line L29 (174.5315, 621.7708) -> (174.5315, 589.7708)
  circle A0 centre (138.7065, 654.6197) radius 2.65
  circle A1 centre (138.7066, 619.7458) radius 2.65
  circle A2 centre (188.5065, 569.9458) radius 2.65
  circle A3 centre (223.3563, 569.9459) radius 2.65
  circle A4 centre (190.0315, 590.2832) radius 1.6
  circle A5 centre (158.8084, 590.4059) radius 1.6
  circle A6 centre (159.0315, 621.2832) radius 1.6
  circle A7 centre (190.0315, 621.2832) radius 1.6
  circle A8 centre (207.7818, 593.3709) radius 6.1
  circle A9 centre (162.2124, 639.0221) radius 6.1
  circle A10 centre (174.5315, 605.7708) radius 16.1
  point P0 (0, 0)
  dimension "d2" = 5.3
  dimension "d3" = 5.3
  dimension "d4" = 5.3
  dimension "d5" = 5.3
  dimension "d6" = 3.2
  dimension "d7" = 3.2
  dimension "d8" = 3.2
  dimension "d9" = 3.2
  dimension "d10" = 12.2
  dimension "d11" = 12.2
  dimension "d12" = 32.2
extrude "Extrusion3" cut sketch "Sketch2" against normal blind 6
properties part number "Z Motor Mount Right"
